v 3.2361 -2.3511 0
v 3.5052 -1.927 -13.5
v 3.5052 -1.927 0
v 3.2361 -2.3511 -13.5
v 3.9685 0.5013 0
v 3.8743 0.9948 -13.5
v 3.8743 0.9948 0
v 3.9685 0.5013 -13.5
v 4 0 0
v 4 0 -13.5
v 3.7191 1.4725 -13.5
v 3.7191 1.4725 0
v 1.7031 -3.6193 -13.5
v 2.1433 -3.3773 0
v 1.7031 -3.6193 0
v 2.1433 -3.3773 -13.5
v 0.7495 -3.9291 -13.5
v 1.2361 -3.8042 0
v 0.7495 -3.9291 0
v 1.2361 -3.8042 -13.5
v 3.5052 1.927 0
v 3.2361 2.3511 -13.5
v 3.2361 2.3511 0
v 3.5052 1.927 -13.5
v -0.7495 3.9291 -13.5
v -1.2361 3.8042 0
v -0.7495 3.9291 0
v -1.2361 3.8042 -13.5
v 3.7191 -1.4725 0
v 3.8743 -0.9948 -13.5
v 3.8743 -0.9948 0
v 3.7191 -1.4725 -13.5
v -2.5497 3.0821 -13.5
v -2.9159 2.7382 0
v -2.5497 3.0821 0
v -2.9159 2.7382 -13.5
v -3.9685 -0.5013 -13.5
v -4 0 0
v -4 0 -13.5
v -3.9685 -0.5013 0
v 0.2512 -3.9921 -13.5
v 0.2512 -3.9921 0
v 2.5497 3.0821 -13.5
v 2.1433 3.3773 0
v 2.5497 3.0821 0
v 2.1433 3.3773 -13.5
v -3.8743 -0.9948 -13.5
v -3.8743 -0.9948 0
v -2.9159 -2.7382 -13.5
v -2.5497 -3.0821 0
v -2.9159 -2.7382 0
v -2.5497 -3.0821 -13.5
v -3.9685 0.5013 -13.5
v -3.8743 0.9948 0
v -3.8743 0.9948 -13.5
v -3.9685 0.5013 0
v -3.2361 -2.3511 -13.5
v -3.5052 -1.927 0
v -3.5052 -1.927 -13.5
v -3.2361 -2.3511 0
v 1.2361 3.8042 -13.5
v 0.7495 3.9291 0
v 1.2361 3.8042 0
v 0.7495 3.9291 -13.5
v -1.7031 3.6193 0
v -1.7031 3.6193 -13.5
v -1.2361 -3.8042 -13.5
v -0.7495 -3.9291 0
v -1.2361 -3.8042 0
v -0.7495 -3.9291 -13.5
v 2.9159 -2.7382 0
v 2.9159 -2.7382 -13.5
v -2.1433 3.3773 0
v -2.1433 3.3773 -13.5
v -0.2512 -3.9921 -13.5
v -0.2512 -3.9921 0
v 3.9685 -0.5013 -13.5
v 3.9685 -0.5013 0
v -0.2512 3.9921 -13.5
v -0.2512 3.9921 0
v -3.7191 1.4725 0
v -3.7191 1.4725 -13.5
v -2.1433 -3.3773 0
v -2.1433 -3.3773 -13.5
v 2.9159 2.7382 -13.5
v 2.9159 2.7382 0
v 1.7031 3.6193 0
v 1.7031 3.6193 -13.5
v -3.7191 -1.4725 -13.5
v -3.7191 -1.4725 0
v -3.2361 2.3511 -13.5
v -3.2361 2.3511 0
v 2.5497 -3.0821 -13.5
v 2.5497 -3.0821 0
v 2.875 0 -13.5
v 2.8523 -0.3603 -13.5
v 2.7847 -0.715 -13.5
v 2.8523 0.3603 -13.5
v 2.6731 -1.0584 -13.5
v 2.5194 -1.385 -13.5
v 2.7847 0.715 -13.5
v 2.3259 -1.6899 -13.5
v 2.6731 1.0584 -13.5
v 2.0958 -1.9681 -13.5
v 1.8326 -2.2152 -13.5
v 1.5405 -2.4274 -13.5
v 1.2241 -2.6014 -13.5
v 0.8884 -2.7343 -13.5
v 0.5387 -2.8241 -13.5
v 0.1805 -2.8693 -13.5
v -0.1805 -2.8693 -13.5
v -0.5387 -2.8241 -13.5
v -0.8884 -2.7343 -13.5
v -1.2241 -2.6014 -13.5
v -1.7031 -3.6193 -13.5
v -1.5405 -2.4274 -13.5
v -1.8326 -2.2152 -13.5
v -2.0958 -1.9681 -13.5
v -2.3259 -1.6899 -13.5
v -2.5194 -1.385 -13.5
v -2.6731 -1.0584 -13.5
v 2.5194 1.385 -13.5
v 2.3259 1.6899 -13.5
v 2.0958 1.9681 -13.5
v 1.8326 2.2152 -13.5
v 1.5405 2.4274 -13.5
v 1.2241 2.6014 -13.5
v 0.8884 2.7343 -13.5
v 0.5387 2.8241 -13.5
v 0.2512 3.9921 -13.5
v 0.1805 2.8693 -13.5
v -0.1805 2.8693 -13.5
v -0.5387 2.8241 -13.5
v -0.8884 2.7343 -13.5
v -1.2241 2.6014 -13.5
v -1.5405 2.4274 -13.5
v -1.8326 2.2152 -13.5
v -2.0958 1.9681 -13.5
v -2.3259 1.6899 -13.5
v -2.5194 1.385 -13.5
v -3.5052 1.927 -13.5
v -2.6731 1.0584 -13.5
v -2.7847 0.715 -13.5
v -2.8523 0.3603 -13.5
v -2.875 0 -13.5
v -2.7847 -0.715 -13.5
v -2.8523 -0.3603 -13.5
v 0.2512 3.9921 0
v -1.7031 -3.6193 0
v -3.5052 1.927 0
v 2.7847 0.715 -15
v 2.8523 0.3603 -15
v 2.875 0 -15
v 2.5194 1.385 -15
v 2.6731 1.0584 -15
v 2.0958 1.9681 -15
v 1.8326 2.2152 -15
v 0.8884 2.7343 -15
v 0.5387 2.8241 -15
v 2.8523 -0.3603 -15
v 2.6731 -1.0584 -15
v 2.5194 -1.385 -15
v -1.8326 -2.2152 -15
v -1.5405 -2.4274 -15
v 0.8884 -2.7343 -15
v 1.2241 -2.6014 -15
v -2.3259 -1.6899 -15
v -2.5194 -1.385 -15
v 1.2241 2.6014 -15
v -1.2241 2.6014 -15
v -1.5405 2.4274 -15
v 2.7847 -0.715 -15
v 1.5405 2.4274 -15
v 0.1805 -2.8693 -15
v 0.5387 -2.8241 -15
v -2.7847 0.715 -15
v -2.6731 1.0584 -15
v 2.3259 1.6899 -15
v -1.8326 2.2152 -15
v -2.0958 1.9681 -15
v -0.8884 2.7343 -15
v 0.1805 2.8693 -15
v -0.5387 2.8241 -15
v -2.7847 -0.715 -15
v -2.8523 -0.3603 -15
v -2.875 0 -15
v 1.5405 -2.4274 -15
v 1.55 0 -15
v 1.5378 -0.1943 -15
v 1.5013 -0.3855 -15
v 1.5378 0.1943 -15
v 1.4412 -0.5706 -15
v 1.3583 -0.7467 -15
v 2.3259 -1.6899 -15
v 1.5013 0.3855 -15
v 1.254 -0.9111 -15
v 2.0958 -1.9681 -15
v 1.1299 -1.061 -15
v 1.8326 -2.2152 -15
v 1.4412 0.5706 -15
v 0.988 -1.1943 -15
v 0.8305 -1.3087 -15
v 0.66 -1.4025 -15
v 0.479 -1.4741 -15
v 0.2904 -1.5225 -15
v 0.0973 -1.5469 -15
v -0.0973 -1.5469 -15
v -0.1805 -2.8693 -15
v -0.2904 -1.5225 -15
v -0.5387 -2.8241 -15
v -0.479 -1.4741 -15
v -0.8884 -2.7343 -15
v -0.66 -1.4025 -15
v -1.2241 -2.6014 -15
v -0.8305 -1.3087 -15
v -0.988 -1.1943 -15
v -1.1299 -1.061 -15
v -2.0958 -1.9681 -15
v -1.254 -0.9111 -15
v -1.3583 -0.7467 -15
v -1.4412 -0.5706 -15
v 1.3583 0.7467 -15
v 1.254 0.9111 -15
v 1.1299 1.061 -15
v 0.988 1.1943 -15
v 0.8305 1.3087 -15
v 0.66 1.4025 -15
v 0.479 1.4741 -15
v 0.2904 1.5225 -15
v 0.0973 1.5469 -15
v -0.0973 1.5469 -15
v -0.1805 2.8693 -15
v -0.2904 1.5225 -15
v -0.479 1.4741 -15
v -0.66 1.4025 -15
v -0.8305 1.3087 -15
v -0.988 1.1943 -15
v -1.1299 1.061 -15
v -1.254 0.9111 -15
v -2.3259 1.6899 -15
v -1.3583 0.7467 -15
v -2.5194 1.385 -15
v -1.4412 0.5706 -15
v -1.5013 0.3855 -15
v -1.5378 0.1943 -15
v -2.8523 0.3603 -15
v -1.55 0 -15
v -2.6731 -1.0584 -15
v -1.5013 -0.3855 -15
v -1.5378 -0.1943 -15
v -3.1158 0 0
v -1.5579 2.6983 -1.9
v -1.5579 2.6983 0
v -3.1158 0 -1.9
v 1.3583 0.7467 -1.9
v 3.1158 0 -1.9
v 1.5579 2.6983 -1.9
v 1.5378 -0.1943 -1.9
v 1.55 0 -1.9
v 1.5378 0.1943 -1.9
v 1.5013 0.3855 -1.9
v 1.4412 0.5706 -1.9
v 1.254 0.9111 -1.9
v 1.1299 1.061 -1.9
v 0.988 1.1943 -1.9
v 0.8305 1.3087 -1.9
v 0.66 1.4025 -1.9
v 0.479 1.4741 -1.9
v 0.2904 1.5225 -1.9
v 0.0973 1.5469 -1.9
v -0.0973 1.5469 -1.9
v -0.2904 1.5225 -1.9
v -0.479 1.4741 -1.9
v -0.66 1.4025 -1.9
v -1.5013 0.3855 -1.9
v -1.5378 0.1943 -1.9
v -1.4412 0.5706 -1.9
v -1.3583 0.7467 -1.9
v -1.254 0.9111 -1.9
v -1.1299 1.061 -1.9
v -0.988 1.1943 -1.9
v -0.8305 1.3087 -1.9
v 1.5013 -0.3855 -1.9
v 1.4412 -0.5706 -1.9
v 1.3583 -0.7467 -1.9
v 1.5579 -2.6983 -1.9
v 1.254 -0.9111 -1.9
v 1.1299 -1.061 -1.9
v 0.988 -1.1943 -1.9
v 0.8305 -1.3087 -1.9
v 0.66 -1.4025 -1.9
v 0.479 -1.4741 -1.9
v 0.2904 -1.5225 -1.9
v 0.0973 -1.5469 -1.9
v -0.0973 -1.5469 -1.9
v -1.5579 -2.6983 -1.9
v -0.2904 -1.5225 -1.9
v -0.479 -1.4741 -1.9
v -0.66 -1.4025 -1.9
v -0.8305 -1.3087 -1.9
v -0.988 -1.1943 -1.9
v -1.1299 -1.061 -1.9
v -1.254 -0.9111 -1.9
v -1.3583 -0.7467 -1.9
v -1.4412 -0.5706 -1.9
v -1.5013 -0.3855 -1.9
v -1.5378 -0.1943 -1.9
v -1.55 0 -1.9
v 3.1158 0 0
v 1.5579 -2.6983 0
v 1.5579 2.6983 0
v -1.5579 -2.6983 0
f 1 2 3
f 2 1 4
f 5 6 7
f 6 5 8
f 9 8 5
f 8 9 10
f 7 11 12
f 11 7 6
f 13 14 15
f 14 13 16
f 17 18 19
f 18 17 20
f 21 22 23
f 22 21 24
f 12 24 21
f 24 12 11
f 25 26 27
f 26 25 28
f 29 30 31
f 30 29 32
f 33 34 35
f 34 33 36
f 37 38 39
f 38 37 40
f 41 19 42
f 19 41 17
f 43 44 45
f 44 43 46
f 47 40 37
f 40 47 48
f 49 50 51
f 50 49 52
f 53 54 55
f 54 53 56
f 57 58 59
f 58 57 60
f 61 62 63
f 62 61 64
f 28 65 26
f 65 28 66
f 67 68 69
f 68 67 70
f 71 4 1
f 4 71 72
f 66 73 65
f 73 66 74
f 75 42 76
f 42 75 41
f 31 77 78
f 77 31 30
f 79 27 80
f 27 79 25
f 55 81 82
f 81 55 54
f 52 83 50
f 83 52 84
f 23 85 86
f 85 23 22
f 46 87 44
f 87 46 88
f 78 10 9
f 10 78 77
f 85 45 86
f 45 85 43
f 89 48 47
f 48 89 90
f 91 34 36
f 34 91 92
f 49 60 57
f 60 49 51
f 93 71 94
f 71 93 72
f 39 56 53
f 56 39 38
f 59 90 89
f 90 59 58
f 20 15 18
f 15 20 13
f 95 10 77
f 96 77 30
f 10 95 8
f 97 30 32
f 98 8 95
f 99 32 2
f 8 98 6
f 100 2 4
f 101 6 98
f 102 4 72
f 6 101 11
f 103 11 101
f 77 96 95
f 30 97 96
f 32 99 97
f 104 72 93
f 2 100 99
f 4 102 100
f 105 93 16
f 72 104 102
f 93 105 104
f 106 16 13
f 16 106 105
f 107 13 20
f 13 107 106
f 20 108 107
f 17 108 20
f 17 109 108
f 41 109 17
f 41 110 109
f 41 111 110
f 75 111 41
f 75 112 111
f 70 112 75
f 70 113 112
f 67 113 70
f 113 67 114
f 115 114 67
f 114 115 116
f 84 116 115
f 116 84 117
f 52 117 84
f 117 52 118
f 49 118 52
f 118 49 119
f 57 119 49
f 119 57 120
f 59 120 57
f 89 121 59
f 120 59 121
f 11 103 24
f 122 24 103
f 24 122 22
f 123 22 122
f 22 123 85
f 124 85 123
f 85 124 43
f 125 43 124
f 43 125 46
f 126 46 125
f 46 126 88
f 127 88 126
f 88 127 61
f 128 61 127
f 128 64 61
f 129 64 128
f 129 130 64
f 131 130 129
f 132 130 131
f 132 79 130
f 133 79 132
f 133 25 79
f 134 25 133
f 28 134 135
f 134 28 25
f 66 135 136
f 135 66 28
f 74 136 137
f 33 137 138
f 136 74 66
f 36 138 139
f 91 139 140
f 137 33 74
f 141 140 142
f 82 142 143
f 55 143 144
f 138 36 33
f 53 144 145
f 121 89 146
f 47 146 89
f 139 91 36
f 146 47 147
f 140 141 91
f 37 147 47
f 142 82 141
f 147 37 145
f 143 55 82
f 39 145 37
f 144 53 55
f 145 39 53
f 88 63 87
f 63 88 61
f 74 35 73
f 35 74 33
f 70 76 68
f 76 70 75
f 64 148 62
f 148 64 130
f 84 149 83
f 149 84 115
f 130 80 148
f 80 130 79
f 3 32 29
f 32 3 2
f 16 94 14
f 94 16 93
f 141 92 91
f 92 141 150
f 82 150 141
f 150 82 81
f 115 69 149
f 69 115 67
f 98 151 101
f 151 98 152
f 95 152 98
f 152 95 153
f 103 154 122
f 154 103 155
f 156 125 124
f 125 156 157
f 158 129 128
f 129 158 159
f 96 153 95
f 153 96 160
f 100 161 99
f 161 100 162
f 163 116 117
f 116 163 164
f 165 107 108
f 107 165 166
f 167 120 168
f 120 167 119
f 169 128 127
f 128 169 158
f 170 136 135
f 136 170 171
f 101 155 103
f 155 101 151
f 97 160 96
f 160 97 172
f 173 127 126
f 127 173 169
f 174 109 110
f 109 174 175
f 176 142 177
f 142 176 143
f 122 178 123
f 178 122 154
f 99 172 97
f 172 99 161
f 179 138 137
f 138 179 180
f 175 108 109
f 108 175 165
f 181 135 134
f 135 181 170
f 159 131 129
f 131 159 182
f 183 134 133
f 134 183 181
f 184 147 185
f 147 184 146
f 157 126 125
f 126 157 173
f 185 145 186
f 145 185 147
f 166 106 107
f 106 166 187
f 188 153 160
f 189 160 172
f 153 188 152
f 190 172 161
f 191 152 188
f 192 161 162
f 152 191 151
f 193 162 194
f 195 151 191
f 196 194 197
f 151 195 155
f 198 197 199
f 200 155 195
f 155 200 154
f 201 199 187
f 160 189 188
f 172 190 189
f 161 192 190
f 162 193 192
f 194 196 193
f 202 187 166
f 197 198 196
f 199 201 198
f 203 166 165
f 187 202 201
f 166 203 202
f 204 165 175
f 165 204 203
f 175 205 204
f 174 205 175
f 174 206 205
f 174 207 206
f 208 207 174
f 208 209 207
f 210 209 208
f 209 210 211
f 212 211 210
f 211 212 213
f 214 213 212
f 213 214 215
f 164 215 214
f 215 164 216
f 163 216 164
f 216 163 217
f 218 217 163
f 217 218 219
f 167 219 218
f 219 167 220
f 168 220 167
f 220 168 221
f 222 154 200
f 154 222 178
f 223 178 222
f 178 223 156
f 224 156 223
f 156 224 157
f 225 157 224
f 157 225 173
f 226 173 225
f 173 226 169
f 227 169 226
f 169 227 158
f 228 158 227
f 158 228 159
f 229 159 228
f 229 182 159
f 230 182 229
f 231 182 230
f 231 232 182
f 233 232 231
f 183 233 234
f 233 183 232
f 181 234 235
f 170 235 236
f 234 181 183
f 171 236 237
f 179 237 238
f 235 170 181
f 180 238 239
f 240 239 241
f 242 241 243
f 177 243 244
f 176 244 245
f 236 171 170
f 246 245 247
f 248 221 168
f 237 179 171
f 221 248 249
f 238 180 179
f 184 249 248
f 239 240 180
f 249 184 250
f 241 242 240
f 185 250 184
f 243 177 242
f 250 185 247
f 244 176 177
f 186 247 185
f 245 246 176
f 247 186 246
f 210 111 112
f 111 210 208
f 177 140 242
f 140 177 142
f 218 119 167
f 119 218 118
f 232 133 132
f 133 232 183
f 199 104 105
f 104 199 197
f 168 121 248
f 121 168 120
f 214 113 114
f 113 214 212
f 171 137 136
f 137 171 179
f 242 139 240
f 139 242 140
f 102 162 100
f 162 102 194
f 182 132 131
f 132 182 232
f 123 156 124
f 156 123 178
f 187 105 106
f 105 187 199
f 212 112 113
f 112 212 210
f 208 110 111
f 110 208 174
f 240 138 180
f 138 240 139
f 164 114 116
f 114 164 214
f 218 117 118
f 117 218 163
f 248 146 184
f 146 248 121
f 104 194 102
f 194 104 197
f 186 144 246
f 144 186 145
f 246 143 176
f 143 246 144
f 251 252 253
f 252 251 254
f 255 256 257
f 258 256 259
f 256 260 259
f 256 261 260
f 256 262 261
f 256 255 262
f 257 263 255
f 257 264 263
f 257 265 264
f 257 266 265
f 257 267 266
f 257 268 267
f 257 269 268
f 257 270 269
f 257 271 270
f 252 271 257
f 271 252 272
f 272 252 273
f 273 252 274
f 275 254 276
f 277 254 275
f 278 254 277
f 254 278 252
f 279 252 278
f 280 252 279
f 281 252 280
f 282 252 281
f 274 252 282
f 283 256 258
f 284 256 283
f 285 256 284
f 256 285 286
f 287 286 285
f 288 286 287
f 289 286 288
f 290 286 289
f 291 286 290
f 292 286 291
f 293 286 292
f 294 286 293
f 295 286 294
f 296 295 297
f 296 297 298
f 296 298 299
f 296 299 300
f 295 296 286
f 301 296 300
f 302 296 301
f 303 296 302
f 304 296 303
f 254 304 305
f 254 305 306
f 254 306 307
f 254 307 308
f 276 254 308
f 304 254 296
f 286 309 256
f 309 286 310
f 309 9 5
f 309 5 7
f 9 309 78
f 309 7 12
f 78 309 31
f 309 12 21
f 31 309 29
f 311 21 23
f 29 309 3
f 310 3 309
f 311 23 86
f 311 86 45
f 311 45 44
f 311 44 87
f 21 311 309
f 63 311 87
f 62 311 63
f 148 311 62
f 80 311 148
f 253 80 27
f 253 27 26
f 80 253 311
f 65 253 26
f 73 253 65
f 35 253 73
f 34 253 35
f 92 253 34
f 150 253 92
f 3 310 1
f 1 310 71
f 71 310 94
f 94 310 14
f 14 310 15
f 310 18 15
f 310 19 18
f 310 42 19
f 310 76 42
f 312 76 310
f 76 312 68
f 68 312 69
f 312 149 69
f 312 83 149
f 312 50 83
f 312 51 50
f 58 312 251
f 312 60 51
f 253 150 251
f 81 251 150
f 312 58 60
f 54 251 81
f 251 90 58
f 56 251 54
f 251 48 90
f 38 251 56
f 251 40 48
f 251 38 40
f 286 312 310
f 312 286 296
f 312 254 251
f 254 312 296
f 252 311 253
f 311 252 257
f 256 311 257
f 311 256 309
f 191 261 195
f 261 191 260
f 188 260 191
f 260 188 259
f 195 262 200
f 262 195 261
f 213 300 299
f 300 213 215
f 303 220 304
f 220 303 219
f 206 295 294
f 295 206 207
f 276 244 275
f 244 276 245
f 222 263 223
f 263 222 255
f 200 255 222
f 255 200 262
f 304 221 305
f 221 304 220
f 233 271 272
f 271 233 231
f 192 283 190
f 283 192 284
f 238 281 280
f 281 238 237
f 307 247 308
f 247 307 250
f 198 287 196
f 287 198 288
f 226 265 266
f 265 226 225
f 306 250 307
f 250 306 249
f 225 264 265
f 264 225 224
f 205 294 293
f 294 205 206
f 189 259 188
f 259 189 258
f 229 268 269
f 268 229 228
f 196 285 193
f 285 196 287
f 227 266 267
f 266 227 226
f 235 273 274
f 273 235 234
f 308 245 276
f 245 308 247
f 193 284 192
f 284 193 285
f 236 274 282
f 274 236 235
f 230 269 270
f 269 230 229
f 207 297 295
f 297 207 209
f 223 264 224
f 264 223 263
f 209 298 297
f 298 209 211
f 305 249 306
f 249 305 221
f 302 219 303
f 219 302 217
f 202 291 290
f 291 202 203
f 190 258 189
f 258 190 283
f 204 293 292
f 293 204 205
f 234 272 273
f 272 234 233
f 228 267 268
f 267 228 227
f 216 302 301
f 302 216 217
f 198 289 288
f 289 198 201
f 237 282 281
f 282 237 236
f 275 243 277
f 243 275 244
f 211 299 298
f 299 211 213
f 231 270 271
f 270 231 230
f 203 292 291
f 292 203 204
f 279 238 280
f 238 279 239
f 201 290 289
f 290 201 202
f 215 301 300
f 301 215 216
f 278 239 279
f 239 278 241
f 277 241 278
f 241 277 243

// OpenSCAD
$fn = 50;

difference() {
	union() {
		translate(v = [0, 0, -13.5]) {
			cylinder(h = 16.5, r = 4.0);
		}
		#translate(v = [0, 0, -15.0]) {
			cylinder(h = 15, r = 2.875);
		}
	}
	union() {
		translate(v = [0, 0, 0]) {
			rotate(a = [0, 0, 0]) {
				difference() {
					union() {
						translate(v = [0, 0, -1.9]) {
							linear_extrude(height = 1.9) {
								polygon(points = [[3.1158, 0.0], [1.5579000000000005, 2.698361953111554], [-1.5578999999999994, 2.6983619531115544], [-3.1158, 3.815754496783323e-16], [-1.5579000000000014, -2.6983619531115535], [1.557899999999998, -2.6983619531115552]]);
							}
						}
					}
					union();
				}
			}
		}
		#cylinder(h = 3, r = 5.0);
		#translate(v = [0, 0, -100.0]) {
			cylinder(h = 200, r = 1.55);
		}
	}
}
